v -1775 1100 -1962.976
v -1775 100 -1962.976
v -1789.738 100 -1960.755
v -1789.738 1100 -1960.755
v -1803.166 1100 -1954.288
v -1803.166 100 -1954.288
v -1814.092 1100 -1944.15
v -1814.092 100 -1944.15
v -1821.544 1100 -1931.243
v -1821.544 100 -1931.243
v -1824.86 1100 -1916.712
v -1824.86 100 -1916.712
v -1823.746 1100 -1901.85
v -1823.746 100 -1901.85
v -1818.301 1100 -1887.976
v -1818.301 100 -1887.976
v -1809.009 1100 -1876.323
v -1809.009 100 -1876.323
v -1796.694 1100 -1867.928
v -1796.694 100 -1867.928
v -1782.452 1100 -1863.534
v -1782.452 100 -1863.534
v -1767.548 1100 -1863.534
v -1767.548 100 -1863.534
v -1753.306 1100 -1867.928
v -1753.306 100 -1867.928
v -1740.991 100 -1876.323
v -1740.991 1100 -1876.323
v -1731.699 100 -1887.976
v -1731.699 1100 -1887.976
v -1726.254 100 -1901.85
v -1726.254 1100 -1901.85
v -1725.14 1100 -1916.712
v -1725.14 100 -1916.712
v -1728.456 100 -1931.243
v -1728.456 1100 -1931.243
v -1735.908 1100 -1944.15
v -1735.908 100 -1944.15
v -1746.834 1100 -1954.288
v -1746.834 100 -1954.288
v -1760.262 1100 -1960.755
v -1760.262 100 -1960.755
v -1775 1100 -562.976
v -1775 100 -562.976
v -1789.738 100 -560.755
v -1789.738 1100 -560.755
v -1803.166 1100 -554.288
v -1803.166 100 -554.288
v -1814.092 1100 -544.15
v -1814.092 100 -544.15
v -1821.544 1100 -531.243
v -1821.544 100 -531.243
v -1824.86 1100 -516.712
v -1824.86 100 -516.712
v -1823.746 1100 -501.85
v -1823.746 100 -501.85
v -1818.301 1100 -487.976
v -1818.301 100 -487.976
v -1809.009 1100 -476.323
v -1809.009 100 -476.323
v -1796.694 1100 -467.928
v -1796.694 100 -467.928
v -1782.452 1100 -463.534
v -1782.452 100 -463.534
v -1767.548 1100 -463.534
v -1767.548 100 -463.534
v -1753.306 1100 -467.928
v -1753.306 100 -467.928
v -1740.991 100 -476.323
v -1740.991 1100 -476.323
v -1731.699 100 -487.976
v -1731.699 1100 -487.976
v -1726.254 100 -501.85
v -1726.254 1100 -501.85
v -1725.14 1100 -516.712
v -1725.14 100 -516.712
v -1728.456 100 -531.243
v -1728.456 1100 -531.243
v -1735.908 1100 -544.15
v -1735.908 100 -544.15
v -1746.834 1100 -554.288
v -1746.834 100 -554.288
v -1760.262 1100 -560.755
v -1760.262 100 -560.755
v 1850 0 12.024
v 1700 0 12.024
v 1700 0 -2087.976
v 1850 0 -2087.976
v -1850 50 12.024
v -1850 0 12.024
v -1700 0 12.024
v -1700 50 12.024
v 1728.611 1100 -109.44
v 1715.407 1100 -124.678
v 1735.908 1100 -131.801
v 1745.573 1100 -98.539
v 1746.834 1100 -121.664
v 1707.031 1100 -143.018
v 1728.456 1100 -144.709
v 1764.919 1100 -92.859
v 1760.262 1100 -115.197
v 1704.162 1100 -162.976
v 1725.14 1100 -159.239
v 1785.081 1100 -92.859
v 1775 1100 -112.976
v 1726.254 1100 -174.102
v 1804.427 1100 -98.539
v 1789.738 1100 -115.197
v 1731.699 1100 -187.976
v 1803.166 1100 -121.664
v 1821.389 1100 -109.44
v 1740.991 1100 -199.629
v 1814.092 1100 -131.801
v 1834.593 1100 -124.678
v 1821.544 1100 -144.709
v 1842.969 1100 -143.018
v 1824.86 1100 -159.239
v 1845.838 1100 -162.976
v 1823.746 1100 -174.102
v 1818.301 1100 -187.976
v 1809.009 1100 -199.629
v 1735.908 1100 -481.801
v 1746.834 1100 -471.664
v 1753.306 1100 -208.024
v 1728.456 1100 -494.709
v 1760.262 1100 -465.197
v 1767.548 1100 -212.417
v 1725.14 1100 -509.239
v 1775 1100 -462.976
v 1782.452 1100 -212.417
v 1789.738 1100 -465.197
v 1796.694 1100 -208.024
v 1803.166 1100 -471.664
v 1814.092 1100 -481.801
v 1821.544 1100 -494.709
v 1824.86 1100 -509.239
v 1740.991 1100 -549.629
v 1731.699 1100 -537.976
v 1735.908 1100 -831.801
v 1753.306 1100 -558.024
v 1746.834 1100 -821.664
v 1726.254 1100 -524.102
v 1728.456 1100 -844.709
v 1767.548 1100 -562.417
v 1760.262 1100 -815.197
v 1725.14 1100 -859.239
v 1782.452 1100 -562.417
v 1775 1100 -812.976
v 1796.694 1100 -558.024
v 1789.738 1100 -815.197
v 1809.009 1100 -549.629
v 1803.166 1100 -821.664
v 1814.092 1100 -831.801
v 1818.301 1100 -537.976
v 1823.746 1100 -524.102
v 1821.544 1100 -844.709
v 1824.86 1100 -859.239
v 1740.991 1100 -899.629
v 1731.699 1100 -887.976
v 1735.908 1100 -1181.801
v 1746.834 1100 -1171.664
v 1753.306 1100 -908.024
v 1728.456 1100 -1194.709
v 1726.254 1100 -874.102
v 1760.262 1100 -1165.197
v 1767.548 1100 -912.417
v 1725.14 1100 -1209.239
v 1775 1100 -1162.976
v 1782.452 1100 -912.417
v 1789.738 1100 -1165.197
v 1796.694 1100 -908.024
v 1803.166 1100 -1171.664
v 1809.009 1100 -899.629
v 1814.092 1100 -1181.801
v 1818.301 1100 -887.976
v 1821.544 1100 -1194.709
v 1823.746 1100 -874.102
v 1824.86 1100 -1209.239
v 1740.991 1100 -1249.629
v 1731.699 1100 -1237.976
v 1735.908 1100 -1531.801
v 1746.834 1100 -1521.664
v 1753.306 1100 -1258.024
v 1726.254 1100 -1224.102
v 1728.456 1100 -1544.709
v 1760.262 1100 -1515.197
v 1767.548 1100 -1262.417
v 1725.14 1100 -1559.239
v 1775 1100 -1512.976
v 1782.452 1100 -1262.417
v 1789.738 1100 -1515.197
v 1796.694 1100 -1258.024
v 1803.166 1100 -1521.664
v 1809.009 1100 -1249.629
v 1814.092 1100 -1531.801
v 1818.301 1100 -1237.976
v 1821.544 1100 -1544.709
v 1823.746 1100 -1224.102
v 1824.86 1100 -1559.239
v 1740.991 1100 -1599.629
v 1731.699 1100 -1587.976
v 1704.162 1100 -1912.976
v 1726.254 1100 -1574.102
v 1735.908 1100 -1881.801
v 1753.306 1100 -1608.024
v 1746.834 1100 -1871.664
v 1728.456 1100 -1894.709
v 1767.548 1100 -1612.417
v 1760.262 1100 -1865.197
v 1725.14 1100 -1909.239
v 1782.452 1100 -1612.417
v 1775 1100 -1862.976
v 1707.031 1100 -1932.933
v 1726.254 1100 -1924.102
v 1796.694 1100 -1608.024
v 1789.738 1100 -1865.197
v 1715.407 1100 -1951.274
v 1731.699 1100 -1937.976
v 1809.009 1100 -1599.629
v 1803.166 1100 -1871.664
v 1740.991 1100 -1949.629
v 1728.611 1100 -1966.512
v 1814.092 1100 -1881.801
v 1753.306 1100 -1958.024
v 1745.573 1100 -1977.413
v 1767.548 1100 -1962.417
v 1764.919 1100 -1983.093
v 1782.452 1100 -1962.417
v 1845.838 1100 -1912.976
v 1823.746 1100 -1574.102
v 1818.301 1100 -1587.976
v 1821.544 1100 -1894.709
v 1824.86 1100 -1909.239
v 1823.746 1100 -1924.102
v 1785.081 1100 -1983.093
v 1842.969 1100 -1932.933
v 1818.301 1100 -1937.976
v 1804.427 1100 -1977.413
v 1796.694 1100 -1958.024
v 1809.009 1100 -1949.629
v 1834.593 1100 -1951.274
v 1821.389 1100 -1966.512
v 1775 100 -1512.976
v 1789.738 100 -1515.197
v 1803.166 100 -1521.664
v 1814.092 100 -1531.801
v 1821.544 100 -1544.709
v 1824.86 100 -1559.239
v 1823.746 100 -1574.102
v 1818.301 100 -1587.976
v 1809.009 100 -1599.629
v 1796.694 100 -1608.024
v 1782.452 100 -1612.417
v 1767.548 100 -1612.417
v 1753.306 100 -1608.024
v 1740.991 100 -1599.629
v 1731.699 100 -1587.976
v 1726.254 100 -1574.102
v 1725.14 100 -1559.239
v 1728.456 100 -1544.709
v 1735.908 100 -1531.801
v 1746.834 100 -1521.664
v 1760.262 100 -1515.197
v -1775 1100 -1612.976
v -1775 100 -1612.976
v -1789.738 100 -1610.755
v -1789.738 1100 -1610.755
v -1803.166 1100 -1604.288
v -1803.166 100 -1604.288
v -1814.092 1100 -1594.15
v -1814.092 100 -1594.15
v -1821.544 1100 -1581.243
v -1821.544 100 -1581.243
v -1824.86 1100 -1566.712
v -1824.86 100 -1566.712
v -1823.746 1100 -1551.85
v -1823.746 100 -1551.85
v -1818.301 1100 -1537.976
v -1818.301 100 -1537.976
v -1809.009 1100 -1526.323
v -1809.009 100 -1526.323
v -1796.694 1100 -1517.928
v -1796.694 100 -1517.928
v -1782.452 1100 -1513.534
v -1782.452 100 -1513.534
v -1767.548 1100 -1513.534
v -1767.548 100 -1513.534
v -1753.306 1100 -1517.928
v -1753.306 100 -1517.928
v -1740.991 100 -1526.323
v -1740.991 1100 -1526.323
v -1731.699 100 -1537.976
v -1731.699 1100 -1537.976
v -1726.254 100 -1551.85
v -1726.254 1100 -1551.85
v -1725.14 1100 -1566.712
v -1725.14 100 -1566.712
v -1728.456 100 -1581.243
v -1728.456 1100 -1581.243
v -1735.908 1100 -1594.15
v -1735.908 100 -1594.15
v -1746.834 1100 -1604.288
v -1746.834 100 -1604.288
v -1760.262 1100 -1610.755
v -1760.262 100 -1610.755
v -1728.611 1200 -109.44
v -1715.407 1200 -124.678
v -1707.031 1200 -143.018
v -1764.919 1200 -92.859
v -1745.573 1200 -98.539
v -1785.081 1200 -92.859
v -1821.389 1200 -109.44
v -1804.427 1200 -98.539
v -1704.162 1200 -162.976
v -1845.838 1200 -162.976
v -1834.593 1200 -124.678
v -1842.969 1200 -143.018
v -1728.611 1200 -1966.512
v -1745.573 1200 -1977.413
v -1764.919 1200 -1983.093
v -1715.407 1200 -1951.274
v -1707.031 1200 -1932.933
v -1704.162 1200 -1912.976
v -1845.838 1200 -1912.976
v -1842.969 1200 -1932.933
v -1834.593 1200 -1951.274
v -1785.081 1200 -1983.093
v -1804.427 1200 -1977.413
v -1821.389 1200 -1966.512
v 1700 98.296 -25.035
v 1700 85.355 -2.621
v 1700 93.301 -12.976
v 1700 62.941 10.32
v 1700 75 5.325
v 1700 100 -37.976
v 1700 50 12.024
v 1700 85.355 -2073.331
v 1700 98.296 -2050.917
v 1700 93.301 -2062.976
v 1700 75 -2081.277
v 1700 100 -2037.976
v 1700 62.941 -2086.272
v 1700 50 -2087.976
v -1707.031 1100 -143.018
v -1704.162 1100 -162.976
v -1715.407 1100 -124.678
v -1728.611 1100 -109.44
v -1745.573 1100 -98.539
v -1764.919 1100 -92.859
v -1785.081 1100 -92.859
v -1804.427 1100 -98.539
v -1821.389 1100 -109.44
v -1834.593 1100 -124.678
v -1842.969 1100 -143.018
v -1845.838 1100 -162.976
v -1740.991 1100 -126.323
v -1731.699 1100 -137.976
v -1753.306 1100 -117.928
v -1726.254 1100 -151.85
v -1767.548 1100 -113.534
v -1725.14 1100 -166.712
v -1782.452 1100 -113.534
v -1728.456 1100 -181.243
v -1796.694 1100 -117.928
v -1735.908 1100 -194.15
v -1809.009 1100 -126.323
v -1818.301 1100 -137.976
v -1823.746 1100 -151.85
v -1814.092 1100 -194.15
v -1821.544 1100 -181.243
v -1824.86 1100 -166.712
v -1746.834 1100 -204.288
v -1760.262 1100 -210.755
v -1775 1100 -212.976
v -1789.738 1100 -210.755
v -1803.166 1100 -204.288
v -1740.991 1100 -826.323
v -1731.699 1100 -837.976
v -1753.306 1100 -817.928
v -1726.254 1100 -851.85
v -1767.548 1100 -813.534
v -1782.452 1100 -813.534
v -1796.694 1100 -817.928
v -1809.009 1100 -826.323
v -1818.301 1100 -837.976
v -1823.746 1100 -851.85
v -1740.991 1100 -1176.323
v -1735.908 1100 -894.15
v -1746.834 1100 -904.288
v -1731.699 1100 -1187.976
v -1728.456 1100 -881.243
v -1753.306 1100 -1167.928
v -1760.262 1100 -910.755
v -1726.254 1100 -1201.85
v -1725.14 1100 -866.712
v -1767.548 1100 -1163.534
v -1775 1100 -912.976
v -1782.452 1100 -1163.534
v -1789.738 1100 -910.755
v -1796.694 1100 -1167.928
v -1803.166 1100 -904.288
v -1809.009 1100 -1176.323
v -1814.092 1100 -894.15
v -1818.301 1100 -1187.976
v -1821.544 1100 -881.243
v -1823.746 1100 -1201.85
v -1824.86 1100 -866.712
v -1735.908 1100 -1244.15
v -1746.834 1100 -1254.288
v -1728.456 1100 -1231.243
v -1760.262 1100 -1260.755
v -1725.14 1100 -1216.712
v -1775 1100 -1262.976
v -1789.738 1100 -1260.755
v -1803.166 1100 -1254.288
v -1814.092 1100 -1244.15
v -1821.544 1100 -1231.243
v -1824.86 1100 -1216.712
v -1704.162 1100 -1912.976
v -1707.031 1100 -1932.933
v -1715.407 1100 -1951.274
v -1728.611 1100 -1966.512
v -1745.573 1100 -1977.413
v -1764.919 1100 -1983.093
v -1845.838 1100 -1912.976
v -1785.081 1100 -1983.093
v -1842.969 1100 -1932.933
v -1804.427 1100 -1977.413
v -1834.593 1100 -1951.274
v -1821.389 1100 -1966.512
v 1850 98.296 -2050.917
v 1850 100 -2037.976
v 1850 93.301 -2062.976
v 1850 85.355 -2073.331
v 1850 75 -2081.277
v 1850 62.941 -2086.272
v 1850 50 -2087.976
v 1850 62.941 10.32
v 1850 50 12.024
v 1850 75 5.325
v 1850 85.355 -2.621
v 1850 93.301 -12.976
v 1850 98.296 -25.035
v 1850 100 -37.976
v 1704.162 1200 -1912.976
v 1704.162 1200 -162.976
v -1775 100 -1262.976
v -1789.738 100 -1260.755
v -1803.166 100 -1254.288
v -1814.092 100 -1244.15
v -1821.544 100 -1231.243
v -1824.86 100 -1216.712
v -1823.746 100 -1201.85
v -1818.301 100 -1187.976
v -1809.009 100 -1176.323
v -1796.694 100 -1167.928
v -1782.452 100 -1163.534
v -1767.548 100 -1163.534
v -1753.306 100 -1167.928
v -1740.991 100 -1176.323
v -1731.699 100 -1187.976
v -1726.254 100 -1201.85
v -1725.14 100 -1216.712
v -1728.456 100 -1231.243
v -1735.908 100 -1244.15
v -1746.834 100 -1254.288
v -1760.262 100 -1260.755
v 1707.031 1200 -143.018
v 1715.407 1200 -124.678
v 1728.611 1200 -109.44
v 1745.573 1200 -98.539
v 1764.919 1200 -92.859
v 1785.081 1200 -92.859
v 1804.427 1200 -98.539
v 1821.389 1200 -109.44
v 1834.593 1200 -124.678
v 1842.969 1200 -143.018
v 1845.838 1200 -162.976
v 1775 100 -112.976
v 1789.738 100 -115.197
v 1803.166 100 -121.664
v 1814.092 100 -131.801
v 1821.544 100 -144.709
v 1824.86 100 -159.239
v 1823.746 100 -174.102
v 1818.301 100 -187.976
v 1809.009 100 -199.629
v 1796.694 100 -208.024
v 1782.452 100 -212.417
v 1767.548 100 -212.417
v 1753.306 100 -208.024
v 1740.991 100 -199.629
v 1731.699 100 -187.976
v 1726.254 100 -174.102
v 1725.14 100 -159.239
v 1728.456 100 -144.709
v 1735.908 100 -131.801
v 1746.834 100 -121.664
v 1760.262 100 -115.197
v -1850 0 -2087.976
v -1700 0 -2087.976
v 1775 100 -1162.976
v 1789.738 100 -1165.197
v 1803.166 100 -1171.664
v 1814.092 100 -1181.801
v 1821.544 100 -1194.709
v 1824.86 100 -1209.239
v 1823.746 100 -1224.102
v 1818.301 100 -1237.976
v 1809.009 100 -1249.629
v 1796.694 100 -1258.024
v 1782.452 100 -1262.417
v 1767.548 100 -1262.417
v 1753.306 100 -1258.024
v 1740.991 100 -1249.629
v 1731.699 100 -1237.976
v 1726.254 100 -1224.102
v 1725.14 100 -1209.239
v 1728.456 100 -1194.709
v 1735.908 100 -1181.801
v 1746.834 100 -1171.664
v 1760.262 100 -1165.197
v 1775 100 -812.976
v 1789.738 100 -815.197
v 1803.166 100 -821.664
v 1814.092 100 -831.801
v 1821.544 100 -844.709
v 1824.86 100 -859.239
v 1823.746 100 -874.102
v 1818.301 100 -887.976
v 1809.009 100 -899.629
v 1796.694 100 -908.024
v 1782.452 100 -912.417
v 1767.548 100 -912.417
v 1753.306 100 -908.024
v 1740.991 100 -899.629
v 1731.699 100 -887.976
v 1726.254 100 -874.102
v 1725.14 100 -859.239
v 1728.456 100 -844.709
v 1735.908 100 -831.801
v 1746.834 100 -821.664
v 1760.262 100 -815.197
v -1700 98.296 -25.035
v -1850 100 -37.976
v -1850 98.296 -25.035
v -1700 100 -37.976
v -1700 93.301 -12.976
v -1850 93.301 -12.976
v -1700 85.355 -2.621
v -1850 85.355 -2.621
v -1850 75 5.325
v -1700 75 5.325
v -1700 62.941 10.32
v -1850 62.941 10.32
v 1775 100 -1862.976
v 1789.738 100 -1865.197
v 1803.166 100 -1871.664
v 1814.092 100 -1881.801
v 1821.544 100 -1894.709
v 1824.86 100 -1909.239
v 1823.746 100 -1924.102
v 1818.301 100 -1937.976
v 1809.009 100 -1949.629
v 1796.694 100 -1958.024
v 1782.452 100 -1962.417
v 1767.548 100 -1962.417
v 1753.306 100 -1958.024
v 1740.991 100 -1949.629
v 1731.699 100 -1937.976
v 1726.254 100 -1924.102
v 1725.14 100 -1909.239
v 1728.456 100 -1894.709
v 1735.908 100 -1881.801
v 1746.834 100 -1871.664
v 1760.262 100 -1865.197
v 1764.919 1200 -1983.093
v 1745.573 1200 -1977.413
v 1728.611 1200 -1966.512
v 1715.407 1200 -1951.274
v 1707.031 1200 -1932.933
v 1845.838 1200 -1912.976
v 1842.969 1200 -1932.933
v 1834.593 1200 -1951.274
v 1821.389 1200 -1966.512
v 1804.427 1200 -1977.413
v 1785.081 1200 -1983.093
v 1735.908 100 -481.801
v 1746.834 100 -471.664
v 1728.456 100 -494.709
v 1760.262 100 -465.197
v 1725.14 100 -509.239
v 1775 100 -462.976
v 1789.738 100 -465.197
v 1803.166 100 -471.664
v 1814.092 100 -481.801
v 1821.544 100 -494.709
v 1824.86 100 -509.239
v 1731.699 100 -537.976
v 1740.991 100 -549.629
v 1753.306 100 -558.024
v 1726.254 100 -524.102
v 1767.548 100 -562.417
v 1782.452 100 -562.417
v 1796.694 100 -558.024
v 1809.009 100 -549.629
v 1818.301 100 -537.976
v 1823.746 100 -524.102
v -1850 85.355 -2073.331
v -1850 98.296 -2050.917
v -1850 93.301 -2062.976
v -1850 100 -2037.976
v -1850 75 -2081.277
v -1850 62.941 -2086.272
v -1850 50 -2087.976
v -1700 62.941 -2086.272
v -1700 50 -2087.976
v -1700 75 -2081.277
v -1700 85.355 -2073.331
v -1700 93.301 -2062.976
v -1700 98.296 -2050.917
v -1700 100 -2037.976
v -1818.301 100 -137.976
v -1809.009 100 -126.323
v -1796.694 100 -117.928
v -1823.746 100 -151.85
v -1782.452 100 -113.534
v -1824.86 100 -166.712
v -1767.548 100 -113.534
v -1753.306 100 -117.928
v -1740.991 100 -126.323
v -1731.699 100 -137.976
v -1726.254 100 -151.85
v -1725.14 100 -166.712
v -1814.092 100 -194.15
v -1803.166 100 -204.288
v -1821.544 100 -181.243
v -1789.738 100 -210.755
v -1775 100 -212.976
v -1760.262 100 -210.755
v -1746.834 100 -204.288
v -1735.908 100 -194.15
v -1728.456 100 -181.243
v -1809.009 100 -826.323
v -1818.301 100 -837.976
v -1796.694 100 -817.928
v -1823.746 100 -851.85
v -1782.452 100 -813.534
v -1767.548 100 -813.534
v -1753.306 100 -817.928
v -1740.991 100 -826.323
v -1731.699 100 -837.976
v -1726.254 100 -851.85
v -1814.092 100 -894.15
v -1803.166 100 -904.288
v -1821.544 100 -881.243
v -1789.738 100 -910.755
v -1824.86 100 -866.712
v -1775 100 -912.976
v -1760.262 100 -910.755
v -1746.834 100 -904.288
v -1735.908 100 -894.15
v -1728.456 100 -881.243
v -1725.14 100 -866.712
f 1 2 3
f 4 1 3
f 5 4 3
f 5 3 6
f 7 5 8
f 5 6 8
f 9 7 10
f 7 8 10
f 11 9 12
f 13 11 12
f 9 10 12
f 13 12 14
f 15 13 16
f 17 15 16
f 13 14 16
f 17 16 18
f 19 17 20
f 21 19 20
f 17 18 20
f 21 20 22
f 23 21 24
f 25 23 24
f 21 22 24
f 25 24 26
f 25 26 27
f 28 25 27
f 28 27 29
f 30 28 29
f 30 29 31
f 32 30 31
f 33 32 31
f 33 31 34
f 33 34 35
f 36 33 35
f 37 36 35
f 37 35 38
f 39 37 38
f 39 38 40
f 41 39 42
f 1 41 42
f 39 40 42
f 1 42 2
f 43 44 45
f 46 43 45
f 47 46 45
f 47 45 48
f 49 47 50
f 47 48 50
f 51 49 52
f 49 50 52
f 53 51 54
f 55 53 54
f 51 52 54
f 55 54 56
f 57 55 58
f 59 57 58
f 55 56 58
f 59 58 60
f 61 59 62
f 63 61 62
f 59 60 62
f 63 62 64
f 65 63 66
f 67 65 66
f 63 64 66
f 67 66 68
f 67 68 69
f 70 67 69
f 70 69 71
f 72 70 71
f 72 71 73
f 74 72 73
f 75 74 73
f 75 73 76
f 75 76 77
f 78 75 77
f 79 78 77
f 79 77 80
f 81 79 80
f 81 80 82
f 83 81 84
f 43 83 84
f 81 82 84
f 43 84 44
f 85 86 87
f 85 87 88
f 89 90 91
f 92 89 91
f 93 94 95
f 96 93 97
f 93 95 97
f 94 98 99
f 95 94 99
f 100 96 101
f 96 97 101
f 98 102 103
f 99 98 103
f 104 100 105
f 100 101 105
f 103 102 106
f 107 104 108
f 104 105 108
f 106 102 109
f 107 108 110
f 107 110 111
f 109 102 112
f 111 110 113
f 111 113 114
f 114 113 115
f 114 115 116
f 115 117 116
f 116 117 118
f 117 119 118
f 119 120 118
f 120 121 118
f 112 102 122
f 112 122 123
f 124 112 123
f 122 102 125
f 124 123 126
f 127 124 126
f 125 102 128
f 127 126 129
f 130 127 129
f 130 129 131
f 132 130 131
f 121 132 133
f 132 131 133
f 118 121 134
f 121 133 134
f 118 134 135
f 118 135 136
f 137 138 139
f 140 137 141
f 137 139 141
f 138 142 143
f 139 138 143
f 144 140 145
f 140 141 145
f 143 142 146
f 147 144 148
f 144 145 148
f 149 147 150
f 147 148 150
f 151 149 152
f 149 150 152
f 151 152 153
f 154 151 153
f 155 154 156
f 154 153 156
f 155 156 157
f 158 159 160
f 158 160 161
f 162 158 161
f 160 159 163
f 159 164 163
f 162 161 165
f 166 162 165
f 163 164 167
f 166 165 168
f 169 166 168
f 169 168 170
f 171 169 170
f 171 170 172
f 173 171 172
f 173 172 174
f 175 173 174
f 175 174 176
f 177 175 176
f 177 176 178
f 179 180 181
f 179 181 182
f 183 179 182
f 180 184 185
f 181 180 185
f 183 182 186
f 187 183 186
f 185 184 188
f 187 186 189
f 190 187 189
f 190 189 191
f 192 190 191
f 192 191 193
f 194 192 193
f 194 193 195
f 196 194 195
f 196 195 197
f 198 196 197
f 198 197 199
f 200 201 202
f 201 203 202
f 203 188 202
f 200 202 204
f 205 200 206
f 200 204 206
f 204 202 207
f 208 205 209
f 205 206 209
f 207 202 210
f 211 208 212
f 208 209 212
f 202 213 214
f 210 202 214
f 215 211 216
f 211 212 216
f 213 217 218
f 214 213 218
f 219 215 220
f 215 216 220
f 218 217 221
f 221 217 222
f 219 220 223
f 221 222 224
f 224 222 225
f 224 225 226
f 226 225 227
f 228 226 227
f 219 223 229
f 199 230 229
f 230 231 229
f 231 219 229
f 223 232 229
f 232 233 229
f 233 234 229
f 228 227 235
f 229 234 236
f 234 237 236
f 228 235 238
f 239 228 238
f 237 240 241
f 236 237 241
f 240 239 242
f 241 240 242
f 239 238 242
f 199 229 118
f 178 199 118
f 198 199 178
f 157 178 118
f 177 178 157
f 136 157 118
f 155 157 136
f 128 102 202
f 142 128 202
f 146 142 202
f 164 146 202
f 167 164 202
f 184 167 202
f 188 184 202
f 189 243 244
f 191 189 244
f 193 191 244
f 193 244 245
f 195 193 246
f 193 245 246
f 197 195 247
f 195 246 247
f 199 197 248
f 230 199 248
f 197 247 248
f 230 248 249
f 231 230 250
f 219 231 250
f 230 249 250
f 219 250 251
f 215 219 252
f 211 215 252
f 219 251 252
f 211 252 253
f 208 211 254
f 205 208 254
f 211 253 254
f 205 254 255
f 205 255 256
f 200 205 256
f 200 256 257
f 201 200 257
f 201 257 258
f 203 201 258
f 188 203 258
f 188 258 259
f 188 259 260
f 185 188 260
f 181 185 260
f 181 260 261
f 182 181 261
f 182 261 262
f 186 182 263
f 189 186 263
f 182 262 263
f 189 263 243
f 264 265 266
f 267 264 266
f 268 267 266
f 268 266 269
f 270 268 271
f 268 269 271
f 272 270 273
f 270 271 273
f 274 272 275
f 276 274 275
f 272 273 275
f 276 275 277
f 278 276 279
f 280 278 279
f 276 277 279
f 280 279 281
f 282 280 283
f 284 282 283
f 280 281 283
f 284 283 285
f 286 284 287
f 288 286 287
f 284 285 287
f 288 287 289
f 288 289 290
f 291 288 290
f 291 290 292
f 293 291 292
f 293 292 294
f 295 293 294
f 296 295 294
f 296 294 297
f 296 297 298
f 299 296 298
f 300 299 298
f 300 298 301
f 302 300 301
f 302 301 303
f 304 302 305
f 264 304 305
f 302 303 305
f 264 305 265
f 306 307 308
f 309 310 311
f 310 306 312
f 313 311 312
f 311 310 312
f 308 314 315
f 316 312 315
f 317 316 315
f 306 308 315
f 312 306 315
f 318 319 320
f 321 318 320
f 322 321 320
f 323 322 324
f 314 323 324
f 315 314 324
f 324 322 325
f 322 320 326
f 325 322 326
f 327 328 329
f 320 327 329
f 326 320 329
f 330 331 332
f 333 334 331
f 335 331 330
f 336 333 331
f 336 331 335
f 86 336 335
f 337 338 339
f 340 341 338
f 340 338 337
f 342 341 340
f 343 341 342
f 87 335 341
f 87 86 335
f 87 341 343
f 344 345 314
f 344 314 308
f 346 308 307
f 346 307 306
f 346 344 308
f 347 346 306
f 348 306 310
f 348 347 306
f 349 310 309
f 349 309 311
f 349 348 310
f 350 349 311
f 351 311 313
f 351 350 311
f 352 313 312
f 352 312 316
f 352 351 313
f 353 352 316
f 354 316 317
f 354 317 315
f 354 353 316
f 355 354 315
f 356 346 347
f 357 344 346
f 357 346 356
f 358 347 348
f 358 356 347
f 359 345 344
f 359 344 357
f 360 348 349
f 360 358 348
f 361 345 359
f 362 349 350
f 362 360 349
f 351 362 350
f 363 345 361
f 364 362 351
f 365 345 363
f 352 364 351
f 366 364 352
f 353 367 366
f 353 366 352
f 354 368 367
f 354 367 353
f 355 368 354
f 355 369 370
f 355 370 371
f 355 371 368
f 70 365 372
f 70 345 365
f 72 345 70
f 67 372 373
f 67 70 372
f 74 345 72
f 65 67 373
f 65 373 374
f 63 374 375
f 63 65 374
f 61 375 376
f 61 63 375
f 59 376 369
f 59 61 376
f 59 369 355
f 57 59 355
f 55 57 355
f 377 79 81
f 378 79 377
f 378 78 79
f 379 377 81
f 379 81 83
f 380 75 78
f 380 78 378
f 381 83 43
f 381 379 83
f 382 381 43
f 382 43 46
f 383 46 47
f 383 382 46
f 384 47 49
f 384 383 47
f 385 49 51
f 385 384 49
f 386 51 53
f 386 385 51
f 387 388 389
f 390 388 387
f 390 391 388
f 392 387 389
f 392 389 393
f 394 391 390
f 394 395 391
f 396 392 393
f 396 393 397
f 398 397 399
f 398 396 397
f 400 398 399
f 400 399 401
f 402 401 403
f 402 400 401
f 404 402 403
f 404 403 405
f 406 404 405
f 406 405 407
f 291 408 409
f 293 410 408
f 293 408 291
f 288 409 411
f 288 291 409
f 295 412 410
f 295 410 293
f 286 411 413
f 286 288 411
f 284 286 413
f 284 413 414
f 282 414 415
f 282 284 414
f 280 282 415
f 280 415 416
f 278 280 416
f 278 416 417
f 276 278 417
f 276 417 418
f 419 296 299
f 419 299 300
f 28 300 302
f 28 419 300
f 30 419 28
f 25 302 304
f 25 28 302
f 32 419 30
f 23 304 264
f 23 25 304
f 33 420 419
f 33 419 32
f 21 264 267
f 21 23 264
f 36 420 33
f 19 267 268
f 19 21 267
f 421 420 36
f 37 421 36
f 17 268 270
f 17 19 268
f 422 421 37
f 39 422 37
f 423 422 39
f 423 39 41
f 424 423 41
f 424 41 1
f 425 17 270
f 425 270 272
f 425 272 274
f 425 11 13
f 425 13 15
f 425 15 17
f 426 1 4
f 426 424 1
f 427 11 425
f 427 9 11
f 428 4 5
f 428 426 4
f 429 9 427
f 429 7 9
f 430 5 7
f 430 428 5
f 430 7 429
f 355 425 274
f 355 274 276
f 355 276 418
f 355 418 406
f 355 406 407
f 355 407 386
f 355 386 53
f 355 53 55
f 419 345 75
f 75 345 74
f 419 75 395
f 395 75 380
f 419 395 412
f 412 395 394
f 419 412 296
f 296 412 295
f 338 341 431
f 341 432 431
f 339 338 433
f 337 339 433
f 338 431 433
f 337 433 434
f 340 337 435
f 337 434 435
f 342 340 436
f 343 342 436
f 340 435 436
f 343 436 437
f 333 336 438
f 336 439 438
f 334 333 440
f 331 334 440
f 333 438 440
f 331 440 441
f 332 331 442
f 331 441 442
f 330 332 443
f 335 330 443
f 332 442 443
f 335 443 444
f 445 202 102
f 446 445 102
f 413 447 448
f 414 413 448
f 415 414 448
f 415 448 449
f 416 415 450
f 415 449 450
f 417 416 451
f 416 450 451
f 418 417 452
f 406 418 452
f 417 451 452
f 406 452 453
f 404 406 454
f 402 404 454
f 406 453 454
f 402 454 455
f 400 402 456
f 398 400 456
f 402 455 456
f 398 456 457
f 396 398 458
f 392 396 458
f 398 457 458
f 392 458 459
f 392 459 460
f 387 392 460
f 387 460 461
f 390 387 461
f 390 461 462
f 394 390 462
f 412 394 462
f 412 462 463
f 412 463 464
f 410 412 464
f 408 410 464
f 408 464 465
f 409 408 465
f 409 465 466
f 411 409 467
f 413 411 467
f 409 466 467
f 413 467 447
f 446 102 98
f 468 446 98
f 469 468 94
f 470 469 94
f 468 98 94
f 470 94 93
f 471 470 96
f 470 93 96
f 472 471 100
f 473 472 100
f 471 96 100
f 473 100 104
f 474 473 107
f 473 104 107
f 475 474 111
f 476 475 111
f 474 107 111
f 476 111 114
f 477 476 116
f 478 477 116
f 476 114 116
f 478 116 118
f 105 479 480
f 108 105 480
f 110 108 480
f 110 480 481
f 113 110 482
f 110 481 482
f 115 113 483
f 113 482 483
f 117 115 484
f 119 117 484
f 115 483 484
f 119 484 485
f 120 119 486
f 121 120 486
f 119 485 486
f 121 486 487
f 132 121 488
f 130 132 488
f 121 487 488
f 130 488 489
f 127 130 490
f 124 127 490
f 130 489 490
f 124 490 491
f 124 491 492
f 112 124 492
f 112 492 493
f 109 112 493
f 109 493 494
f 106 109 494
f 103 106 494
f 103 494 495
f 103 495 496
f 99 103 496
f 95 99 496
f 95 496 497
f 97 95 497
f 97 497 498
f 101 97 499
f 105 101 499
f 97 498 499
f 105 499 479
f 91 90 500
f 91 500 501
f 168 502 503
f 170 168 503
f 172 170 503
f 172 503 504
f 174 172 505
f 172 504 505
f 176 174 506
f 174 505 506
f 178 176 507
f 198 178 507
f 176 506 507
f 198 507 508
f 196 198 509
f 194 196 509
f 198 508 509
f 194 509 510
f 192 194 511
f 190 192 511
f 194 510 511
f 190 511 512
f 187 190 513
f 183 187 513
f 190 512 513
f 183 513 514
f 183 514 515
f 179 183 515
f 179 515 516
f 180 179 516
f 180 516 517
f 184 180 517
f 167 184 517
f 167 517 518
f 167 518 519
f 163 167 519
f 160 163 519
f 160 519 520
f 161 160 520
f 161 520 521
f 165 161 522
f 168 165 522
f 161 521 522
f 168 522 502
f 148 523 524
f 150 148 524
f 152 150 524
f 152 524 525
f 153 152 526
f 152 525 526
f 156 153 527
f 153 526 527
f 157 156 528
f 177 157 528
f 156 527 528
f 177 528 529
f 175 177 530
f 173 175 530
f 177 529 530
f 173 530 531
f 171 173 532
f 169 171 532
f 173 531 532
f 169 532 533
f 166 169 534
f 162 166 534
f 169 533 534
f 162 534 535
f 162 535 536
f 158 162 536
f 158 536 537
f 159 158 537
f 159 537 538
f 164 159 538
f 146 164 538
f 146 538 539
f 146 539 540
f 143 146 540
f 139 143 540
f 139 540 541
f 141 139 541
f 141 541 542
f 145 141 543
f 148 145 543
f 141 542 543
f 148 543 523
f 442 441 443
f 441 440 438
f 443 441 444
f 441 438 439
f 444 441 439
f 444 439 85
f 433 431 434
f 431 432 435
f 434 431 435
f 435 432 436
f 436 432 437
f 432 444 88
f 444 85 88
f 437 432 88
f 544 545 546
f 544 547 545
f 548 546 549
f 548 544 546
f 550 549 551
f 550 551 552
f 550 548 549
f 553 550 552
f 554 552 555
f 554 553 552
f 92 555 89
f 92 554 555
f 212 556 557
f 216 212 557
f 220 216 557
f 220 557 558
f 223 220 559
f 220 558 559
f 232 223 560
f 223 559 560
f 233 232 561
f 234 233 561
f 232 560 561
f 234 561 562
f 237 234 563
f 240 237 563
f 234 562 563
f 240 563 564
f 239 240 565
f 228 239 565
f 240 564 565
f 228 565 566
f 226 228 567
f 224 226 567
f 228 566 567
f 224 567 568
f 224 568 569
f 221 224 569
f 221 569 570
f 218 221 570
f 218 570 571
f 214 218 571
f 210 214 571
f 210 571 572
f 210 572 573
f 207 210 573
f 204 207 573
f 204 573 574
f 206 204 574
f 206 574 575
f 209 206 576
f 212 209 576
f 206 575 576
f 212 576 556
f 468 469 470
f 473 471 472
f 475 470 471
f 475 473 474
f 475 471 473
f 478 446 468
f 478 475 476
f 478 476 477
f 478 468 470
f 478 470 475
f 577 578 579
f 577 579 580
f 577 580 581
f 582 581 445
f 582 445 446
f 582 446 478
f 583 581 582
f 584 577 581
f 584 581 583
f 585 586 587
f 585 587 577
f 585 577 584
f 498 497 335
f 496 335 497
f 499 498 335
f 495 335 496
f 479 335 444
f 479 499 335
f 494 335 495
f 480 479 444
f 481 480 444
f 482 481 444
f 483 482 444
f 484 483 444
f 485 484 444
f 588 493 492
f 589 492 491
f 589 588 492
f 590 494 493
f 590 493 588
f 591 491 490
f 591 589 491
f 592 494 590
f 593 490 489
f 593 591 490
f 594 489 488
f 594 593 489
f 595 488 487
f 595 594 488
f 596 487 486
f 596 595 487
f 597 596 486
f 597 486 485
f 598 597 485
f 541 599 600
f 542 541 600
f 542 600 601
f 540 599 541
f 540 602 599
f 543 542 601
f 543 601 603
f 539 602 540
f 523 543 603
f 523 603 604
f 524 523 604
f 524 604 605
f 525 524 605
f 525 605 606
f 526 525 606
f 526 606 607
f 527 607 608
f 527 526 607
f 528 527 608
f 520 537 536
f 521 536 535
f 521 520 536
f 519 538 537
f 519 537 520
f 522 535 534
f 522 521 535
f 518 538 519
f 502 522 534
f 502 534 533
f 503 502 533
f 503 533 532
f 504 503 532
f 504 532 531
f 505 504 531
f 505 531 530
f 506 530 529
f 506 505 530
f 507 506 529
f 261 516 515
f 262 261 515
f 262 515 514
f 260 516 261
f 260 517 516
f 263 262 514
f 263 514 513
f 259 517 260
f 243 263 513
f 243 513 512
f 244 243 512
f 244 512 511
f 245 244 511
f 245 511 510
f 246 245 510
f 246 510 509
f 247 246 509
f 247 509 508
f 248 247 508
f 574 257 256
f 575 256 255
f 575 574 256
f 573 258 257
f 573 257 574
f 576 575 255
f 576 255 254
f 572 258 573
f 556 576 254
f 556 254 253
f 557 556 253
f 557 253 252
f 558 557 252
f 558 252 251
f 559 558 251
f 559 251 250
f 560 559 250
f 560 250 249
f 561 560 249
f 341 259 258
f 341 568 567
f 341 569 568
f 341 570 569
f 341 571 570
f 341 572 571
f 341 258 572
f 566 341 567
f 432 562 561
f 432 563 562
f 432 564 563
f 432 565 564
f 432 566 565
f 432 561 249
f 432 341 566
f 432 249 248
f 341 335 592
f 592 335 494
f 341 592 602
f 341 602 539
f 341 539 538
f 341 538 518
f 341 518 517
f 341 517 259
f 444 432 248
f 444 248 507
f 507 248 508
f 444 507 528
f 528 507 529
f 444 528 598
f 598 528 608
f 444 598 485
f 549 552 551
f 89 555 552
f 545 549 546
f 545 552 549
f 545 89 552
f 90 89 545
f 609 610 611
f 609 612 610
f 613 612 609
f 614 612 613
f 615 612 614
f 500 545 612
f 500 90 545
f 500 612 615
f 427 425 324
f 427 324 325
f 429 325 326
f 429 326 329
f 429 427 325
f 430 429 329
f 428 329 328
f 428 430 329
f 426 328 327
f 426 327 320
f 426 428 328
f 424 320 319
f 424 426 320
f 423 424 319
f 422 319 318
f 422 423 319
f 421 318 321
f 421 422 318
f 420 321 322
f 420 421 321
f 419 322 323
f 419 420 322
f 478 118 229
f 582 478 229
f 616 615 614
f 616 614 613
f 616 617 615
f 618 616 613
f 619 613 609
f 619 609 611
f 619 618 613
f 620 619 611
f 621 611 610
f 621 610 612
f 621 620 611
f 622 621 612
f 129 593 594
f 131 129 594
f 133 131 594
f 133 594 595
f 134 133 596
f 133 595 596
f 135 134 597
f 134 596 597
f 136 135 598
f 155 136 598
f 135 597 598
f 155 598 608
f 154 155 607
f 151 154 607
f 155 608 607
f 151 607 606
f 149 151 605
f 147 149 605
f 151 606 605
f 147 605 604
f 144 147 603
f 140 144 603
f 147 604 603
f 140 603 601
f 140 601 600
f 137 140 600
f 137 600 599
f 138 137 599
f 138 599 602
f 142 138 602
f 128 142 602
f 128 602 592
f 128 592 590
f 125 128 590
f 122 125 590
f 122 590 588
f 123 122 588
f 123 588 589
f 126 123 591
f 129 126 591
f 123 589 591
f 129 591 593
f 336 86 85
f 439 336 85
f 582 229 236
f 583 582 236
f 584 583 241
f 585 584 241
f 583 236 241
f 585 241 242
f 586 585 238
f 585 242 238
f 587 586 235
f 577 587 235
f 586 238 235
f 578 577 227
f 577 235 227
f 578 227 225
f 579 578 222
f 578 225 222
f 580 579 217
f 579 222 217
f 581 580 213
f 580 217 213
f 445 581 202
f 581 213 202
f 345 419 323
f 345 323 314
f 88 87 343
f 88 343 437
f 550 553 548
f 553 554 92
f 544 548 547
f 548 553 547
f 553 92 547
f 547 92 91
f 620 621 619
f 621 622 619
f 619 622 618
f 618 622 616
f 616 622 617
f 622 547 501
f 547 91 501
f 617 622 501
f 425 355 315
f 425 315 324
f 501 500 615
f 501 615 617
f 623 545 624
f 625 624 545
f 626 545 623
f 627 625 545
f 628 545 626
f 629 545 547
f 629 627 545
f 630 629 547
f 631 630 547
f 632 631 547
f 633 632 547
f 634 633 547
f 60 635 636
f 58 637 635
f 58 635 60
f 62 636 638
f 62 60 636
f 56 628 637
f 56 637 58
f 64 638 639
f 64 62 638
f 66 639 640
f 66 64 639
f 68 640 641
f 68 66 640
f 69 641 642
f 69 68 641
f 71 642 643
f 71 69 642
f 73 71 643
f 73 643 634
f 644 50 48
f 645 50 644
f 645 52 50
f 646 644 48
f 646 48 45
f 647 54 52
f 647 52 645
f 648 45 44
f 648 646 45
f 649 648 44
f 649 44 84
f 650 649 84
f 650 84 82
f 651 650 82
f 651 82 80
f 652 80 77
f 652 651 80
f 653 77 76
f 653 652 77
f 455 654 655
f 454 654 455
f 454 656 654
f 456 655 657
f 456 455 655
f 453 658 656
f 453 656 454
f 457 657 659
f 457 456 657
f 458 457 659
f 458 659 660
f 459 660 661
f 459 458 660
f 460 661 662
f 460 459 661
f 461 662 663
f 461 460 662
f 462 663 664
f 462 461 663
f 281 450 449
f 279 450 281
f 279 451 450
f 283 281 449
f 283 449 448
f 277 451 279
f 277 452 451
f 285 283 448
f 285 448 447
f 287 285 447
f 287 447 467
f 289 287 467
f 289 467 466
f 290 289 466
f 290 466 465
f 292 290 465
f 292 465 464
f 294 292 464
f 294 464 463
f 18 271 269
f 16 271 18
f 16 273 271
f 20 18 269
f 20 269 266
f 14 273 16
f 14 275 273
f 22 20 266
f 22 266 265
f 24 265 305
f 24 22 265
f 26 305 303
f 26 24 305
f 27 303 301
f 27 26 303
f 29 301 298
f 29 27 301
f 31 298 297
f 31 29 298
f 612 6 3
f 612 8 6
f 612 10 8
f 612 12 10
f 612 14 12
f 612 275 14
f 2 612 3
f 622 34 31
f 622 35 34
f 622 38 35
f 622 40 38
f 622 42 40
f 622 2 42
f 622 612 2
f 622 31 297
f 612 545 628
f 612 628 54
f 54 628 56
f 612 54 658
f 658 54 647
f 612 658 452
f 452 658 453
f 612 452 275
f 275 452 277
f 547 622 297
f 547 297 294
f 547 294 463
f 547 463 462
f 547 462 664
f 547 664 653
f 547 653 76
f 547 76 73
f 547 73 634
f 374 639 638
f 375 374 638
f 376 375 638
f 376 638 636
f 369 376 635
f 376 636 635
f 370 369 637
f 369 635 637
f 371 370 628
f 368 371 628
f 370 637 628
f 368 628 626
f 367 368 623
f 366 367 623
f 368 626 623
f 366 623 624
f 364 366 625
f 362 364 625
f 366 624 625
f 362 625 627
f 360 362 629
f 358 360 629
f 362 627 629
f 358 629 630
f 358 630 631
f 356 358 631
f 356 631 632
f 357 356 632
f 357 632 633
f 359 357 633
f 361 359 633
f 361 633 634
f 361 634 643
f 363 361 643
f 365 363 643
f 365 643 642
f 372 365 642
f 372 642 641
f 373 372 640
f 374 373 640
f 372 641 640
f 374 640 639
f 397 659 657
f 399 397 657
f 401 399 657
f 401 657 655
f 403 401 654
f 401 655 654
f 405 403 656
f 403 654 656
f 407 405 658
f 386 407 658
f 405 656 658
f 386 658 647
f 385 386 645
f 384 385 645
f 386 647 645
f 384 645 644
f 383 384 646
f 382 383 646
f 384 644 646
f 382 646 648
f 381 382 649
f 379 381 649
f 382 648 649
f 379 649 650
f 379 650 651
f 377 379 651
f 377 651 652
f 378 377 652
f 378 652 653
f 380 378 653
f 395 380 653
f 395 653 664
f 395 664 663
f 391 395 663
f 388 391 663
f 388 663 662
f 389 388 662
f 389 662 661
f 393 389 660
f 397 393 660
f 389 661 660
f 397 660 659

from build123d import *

# Parameters (mm, degrees)
SKETCH2_W             = 150
SKETCH2_H             = 2100
BOSS_EXTRUDE3_DEPTH   = 100
BOSS_EXTRUDE3_2_DEPTH = 100
SKETCH3_R             = 50
BOSS_EXTRUDE4_DEPTH   = 1000
LPATTERN1_COUNT       = 6
LPATTERN1_PITCH       = 350
SKETCH5_R             = 50
BOSS_EXTRUDE5_DEPTH   = 1000
LPATTERN2_COUNT       = 6
LPATTERN2_PITCH       = 350
FILLET1_R             = 50
FILLET2_R             = 50
FILLET3_R             = 50
FILLET4_R             = 50
BOSS_EXTRUDE8_DEPTH   = 100


with BuildPart() as part:
    # Sketch2 → Boss-Extrude3 (new body)
    with BuildSketch(Plane(origin=(0, 0, 0), x_dir=(1, 0, 0), z_dir=(0, 1, 0))):
        with Locations((1775, 1037.975951904)):
            Rectangle(SKETCH2_W, SKETCH2_H)
    extrude(amount=BOSS_EXTRUDE3_DEPTH)

    # Sketch5 → Boss-Extrude5 (add)
    with BuildSketch(Plane(origin=(0, 100, 0), x_dir=(1, 0, 0), z_dir=(0, 1, 0))):
        with Locations(Location((1775, 1912.975951904, 0), (0, 0, 270))):
            Circle(SKETCH5_R)
    boss_extrude5 = extrude(amount=BOSS_EXTRUDE5_DEPTH)

    # LPattern2: Boss-Extrude5 ×6
    with Locations(*[(0, 0, i * LPATTERN2_PITCH) for i in range(1, LPATTERN2_COUNT)]):
        add(boss_extrude5)

    # Fillet3
    fillet3_edges = [part.edges().sort_by_distance(p)[0] for p in [
        (1775, 100, 12.024048096),
    ]]
    fillet(fillet3_edges, radius=FILLET3_R)

    # Fillet4
    fillet4_edges = [part.edges().sort_by_distance(p)[0] for p in [
        (1775, 100, -2087.975951904),
    ]]
    fillet(fillet4_edges, radius=FILLET4_R)



with BuildPart() as body_2:
    # Sketch2 → Boss-Extrude3 2 (new body)
    with BuildSketch(Plane(origin=(0, 0, 0), x_dir=(1, 0, 0), z_dir=(0, 1, 0))):
        with Locations((-1775, 1037.975951904)):
            Rectangle(SKETCH2_W, SKETCH2_H)
    extrude(amount=BOSS_EXTRUDE3_2_DEPTH)

    # Sketch3 → Boss-Extrude4 (add)
    with BuildSketch(Plane(origin=(0, 100, 0), x_dir=(1, 0, 0), z_dir=(0, 1, 0))):
        with Locations(Location((-1775, 162.975951904, 0), (0, 0, 90))):
            Circle(SKETCH3_R)
    boss_extrude4 = extrude(amount=BOSS_EXTRUDE4_DEPTH)

    # LPattern1: Boss-Extrude4 ×6
    with Locations(*[(0, 0, -i * LPATTERN1_PITCH) for i in range(1, LPATTERN1_COUNT)]):
        add(boss_extrude4)

    # Fillet1
    fillet1_edges = [body_2.edges().sort_by_distance(p)[0] for p in [
        (-1775, 100, -2087.975951904),
    ]]
    fillet(fillet1_edges, radius=FILLET1_R)

    # Fillet2
    fillet2_edges = [body_2.edges().sort_by_distance(p)[0] for p in [
        (-1775, 100, 12.024048096),
    ]]
    fillet(fillet2_edges, radius=FILLET2_R)


with BuildPart() as part_1:
    add(part.part)

    add(body_2.part)  # Boss-Extrude8 merges body 2
    # Sketch13 → Boss-Extrude8 (add)
    with BuildSketch(Plane(origin=(0, 1100, 0), x_dir=(1, 0, 0), z_dir=(0, 1, 0))):
        with BuildLine():
            Line((-1845.838339321, 162.975951904), (-1845.838339321, 1912.975951904))
            ThreePointArc((-1845.838339321, 1912.975951904), (-1775, 1983.814291225), (-1704.161660679, 1912.975951904))
            Line((-1704.161660679, 1912.975951904), (-1704.161660679, 162.975951904))
            ThreePointArc((-1704.161660679, 162.975951904), (-1775, 92.137612583), (-1845.838339321, 162.975951904))
        make_face()
        with BuildLine():
            Line((1845.838339321, 162.975951904), (1845.838339321, 1912.975951904))
            ThreePointArc((1845.838339321, 1912.975951904), (1775, 1983.814291225), (1704.161660679, 1912.975951904))
            Line((1704.161660679, 1912.975951904), (1704.161660679, 162.975951904))
            ThreePointArc((1704.161660679, 162.975951904), (1775, 92.137612583), (1845.838339321, 162.975951904))
        make_face()
    extrude(amount=BOSS_EXTRUDE8_DEPTH)


solid = part_1.part
